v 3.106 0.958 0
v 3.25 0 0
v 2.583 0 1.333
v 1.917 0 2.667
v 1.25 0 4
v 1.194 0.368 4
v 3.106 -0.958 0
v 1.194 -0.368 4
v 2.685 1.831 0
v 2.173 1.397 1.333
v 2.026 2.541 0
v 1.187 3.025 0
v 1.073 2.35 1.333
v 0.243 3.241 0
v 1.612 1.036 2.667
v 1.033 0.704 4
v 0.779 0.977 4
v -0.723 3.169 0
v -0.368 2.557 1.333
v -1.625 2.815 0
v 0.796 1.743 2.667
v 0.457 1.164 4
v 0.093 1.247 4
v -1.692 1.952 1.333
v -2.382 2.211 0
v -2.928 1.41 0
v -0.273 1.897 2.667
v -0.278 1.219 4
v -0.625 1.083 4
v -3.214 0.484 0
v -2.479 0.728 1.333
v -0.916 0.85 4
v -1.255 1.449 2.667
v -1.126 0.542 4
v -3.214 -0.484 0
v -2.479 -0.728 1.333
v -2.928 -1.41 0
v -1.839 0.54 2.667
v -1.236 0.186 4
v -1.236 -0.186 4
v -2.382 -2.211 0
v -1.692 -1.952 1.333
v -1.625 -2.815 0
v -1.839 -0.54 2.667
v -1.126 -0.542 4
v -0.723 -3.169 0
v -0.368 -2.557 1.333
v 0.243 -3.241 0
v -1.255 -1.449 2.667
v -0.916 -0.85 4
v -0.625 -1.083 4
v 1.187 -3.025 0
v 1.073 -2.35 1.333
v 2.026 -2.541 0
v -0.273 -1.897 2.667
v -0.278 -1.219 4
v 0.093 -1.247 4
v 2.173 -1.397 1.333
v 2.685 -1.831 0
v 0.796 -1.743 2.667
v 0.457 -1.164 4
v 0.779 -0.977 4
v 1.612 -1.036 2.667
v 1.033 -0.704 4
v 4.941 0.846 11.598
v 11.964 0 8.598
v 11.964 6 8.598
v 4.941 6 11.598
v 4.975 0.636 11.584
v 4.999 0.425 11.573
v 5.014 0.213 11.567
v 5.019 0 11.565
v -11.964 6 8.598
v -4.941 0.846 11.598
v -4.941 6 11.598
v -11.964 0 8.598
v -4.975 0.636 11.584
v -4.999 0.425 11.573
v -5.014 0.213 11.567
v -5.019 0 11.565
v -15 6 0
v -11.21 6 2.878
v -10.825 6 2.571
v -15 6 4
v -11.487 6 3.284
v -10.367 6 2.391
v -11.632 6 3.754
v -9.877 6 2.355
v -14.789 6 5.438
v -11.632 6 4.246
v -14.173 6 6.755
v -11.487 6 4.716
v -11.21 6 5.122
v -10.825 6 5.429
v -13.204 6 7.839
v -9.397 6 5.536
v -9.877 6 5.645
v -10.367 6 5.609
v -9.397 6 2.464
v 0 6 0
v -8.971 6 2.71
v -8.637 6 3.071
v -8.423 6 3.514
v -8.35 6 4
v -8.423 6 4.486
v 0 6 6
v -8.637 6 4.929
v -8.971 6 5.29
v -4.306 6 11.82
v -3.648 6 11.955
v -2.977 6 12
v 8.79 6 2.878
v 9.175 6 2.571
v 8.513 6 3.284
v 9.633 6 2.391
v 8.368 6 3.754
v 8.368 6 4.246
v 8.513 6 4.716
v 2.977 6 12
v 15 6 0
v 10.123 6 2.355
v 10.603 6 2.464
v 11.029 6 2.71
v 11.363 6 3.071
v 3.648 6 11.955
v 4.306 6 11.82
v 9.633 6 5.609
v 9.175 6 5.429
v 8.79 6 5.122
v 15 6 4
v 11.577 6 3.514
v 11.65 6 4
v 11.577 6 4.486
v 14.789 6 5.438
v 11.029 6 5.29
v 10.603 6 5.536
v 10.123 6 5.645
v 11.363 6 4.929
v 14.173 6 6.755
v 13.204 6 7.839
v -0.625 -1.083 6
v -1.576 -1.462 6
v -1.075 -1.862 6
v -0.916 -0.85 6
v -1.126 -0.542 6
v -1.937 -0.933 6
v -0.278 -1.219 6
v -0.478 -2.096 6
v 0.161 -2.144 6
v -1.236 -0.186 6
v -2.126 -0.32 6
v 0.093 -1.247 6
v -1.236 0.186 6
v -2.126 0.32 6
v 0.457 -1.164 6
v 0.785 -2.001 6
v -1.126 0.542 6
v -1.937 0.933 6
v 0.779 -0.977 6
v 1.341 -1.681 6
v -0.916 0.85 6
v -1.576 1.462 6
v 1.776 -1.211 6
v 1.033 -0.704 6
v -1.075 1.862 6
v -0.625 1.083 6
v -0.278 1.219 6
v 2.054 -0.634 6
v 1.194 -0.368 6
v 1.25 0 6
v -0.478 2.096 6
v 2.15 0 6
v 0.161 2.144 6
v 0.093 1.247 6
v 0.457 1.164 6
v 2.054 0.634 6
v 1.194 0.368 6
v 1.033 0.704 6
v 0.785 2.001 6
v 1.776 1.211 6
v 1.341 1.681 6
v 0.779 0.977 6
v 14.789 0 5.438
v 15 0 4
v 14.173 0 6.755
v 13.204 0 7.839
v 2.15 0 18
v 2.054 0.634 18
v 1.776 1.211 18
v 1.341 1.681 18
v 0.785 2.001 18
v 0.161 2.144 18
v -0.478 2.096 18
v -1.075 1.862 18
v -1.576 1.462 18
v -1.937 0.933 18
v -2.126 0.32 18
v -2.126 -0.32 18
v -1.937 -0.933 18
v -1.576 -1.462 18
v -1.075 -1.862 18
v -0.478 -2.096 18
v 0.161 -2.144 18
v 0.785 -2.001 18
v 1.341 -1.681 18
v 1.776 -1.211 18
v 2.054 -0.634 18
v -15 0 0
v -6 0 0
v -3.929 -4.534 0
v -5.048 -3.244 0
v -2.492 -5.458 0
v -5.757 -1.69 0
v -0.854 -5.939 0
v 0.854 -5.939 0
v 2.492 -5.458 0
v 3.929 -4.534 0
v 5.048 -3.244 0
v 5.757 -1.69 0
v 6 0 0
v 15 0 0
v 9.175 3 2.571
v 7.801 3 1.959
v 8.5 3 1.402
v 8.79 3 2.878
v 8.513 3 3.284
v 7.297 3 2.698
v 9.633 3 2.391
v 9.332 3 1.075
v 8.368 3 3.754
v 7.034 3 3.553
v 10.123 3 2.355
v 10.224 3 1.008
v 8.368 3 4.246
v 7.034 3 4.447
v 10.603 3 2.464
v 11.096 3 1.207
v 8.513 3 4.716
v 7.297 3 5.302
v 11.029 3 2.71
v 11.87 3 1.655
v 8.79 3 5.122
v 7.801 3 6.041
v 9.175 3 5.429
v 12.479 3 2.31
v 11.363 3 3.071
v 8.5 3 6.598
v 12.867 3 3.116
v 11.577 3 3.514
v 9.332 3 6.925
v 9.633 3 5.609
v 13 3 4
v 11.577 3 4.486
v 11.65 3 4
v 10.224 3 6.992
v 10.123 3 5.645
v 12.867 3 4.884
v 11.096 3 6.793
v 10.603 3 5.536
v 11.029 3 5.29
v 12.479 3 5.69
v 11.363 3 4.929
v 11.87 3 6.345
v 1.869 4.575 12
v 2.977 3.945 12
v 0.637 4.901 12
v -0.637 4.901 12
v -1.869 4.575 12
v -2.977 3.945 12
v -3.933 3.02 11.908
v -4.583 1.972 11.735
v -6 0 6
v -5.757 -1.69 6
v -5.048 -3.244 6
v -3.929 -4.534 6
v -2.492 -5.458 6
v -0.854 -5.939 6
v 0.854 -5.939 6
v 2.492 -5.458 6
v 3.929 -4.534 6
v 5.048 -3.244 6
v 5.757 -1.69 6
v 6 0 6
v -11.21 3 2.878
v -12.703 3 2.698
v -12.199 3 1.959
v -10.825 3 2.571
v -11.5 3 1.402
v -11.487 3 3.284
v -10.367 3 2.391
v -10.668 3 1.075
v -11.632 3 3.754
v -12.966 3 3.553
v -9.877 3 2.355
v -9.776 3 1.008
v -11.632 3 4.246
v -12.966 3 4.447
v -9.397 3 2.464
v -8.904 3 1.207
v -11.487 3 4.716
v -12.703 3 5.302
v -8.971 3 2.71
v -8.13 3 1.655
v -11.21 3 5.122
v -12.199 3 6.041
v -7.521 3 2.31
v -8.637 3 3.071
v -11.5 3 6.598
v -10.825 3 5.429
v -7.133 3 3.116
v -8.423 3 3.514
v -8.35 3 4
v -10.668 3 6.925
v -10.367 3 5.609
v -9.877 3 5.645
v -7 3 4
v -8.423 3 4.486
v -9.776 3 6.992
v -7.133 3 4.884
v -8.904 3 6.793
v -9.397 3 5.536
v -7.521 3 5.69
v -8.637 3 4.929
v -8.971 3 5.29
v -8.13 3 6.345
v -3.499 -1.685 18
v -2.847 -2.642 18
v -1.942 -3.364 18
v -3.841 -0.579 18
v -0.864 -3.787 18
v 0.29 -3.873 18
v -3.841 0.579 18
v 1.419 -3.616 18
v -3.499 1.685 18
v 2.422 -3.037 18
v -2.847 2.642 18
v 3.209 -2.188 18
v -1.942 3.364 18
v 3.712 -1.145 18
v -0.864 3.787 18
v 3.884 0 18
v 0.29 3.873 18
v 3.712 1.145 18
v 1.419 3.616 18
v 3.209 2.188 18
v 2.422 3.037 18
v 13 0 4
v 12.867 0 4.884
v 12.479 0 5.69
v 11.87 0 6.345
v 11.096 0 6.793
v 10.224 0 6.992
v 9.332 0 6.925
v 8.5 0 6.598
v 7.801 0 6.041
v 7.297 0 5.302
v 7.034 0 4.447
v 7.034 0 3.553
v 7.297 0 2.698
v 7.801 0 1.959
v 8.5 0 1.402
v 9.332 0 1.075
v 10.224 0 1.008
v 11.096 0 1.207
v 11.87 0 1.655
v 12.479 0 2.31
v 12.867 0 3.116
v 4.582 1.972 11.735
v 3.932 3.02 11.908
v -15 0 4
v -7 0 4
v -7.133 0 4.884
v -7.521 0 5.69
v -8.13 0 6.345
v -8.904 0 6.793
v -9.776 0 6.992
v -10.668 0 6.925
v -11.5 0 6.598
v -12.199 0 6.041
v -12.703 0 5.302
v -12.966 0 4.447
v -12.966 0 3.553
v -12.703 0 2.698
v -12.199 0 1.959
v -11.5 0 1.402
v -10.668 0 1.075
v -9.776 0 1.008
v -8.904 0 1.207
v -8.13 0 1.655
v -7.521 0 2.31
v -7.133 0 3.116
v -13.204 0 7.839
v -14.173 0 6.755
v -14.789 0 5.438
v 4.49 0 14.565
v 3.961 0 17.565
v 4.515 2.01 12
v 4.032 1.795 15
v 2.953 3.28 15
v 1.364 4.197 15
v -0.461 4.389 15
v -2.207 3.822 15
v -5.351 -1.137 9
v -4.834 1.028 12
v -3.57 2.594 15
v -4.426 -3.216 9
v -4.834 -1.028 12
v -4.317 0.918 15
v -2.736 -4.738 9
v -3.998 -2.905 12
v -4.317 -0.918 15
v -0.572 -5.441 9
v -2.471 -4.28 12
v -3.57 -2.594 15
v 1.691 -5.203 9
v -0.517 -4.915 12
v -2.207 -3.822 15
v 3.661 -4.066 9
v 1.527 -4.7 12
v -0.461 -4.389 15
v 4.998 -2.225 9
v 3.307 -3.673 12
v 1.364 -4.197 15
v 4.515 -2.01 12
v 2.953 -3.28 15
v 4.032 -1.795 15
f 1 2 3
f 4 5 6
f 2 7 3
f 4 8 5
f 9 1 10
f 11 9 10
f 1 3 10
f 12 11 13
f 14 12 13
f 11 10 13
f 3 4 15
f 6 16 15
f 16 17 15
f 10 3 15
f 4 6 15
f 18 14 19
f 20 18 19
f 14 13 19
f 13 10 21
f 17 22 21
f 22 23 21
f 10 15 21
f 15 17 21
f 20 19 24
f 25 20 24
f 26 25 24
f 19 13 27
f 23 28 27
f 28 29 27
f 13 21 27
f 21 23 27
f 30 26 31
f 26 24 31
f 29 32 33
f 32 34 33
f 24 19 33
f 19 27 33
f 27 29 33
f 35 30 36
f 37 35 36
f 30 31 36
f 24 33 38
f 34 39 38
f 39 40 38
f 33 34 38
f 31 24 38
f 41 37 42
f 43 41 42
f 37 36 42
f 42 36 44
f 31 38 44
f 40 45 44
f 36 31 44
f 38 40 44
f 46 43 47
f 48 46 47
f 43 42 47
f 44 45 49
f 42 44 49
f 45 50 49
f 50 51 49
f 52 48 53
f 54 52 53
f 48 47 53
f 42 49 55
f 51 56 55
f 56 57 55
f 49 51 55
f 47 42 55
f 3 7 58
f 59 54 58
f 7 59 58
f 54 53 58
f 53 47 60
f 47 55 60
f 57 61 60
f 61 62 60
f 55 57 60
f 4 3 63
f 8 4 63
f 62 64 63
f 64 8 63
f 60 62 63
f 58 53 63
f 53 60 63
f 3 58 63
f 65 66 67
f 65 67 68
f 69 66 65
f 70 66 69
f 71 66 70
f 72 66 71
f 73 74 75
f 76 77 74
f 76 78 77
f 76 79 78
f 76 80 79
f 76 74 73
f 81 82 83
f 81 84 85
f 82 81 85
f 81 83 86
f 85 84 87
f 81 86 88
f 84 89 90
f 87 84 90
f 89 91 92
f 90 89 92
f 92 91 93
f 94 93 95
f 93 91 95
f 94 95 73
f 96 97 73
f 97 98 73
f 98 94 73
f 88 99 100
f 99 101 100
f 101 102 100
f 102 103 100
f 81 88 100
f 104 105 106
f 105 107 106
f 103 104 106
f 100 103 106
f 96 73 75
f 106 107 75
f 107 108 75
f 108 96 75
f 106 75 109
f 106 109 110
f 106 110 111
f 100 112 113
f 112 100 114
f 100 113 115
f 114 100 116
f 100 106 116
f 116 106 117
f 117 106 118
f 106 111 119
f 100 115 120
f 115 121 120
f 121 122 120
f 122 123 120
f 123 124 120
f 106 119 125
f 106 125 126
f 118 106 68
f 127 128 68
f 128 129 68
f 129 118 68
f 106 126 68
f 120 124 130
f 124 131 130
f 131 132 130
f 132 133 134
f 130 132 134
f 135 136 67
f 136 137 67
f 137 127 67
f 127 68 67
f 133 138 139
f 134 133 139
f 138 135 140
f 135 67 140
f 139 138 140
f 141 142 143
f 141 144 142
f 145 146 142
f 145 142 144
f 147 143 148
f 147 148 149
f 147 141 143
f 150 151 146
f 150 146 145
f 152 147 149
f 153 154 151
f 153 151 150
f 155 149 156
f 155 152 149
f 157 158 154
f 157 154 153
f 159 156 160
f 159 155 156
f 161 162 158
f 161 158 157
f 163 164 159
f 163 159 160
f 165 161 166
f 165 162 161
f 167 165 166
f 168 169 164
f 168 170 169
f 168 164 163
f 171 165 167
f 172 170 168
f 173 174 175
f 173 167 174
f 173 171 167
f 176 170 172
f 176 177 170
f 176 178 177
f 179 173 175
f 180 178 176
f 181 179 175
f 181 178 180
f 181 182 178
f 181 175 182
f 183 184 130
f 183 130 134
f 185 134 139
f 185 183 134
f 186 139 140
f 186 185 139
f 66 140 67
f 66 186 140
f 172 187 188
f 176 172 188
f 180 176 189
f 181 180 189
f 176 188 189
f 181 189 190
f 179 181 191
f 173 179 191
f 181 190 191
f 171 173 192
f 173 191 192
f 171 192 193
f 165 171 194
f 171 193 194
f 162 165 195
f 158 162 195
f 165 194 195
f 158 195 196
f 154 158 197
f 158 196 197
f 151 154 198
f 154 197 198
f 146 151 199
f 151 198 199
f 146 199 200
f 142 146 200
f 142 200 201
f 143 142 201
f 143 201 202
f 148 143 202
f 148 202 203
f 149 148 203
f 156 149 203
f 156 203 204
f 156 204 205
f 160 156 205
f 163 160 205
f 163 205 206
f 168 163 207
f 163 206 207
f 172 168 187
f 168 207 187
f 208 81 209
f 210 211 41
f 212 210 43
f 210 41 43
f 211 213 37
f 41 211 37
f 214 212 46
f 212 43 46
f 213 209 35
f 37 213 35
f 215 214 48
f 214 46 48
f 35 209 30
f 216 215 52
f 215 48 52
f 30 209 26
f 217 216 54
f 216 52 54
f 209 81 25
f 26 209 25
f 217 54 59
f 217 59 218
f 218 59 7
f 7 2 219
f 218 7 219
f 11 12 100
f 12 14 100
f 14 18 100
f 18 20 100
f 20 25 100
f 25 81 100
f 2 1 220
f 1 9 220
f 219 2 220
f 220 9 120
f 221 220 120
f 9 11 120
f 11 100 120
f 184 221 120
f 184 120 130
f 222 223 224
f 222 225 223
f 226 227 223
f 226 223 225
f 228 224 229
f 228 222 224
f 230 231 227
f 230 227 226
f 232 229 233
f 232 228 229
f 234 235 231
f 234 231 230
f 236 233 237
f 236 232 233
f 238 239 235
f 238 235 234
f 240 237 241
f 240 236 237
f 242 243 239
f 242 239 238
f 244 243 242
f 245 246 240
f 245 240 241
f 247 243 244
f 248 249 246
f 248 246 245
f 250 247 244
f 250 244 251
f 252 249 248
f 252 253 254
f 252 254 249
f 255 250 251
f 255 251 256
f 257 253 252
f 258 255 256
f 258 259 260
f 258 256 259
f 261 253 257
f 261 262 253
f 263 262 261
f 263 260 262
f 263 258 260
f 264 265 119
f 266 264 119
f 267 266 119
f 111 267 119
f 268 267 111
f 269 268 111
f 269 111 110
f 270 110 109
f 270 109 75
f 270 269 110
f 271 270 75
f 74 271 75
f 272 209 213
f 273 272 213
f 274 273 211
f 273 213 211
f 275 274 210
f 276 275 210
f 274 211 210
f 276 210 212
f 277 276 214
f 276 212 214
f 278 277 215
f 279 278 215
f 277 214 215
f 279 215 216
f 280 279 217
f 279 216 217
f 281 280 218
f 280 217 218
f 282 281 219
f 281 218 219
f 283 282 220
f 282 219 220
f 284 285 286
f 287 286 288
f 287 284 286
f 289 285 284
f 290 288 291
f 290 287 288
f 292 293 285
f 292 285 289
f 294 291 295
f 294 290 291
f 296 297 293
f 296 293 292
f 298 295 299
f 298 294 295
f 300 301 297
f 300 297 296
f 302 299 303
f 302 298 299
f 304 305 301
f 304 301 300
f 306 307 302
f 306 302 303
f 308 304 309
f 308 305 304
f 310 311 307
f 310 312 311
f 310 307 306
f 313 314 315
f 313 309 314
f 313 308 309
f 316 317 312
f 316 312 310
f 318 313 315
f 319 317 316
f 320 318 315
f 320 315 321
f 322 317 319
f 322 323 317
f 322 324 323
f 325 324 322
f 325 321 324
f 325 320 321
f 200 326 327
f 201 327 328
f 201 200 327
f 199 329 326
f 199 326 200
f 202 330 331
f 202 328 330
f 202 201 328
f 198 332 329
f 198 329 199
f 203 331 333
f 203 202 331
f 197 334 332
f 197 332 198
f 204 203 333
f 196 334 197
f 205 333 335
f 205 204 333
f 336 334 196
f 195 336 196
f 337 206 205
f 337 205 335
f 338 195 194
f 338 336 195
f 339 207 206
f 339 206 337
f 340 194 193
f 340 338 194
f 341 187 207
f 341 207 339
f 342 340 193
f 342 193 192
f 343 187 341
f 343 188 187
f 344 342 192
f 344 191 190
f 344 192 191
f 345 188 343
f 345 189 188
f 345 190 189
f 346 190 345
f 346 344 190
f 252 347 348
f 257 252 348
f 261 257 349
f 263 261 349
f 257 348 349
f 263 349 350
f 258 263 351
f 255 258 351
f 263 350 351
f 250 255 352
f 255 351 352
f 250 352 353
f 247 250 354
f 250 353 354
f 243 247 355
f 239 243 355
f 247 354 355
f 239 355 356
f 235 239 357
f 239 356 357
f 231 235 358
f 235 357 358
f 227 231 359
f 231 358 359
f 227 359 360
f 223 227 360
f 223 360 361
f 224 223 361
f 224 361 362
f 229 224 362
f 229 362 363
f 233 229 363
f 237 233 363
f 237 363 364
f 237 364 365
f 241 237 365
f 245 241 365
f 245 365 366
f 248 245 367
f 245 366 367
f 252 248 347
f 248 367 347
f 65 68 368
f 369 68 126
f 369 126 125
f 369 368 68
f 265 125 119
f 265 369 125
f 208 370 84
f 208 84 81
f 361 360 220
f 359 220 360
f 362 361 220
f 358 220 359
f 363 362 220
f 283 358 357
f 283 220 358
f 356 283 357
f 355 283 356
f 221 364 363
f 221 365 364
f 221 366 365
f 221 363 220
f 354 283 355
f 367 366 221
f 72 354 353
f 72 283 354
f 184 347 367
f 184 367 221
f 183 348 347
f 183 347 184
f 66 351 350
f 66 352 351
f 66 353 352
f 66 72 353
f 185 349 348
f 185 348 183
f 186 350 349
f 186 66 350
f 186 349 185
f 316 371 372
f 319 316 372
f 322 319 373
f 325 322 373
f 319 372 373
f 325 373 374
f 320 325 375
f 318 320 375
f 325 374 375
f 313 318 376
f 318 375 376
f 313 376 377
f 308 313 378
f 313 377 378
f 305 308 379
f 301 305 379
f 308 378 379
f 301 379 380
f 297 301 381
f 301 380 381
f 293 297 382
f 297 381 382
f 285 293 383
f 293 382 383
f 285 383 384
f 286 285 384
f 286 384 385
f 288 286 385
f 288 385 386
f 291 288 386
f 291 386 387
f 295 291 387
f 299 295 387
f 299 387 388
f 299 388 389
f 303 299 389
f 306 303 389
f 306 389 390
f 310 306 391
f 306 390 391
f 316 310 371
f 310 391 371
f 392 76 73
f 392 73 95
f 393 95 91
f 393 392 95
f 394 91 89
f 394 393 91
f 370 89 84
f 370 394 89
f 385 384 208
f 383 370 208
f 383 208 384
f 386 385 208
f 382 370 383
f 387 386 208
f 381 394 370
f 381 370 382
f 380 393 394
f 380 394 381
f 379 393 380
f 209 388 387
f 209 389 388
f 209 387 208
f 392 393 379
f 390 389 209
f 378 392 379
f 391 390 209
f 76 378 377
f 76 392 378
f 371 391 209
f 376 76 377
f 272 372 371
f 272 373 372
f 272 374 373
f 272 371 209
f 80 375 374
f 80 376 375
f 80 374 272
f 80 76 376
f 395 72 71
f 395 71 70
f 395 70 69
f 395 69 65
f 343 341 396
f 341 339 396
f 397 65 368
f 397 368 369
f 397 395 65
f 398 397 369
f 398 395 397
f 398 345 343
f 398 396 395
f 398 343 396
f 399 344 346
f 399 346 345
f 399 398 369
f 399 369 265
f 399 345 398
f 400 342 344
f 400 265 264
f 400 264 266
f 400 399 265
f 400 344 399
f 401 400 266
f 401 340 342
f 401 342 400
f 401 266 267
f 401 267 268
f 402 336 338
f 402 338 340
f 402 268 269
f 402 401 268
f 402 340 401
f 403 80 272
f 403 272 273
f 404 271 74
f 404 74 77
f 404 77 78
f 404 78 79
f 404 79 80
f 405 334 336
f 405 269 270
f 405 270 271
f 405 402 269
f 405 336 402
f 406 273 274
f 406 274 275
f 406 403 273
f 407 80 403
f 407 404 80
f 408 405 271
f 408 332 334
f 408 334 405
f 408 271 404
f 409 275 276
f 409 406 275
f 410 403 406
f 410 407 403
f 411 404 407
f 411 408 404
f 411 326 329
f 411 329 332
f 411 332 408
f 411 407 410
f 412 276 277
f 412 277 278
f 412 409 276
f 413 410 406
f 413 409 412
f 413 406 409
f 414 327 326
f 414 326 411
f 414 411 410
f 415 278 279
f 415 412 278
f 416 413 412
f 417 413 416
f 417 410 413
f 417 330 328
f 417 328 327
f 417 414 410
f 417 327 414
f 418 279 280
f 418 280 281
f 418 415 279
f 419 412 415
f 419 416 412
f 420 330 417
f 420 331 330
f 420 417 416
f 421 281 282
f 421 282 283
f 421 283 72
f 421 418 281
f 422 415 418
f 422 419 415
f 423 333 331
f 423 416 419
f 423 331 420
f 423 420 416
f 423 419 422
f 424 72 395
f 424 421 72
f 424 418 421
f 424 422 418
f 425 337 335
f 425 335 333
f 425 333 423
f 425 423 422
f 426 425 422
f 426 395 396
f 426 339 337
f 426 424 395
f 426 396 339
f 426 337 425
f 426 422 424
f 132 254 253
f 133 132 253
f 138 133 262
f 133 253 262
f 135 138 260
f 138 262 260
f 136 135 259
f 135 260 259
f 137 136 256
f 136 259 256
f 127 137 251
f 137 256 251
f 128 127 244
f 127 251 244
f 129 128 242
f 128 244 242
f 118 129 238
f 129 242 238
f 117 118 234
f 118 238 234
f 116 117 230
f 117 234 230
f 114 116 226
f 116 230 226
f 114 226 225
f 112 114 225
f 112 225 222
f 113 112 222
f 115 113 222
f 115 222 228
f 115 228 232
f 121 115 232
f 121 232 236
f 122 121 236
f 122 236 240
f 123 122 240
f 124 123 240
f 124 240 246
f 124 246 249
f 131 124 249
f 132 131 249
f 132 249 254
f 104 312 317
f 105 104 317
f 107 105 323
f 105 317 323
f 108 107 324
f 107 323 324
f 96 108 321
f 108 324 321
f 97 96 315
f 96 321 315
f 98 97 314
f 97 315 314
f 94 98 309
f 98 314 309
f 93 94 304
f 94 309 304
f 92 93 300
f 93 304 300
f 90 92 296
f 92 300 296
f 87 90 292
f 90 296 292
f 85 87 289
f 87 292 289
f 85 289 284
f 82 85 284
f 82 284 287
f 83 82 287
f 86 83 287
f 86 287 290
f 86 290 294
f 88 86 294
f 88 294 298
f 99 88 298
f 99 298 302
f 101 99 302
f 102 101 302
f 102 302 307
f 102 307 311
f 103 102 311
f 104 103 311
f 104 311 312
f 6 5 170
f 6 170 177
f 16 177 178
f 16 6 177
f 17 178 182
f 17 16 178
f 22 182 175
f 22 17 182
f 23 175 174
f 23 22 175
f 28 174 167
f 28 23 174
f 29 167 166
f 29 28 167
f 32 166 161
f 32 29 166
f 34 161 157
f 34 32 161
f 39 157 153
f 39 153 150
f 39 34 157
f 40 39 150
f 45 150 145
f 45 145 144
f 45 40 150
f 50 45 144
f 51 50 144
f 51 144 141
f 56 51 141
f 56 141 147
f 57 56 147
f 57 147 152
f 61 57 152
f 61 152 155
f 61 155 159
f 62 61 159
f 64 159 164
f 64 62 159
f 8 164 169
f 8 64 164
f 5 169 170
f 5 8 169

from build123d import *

# Parameters (mm, degrees)
F1_R      = 1.65
F2_DEPTH  = 6
F3_R      = 3.75
F4_DEPTH  = 12.001
F5_R      = 6
F5_R_2    = 1.25
F6_DEPTH  = 6
F7_SIZE2  = 4
F7_SIZE   = 2
F8_R      = 6
F9_DEPTH  = 12
F9_TAPER  = 10
F10_R     = 2.15
F11_DEPTH = 12
F12_R     = 3
F13_DEPTH = 3
F14_R     = 3
F15_DEPTH = 3


with BuildPart() as f2:
    # F1 (on Front) → F2 (new body)
    with BuildSketch(Plane.XZ):
        with BuildLine():
            Line((15, 0), (15, 4))
            ThreePointArc((15, 4), (14.1725596506, 6.7549493575), (11.9641016151, 8.5980762114))
            Line((11.9641016151, 8.5980762114), (4.9409269852, 11.5980762114))
            ThreePointArc((4.9409269852, 11.5980762114), (3.9792272214, 11.8984885963), (2.9768253701, 12))
            Line((2.9768253701, 12), (0, 12))
            Line((0, 12), (-2.9768253701, 12))
            ThreePointArc((-2.9768253701, 12), (-3.9792272214, 11.8984885963), (-4.9409269852, 11.5980762114))
            Line((-4.9409269852, 11.5980762114), (-11.9641016151, 8.5980762114))
            ThreePointArc((-11.9641016151, 8.5980762114), (-14.1725596506, 6.7549493575), (-15, 4))
            Line((-15, 4), (-15, 0))
            Line((-15, 0), (0, 0))
            Line((0, 0), (15, 0))
        make_face()
        with Locations((-10, 4)):
            Circle(F1_R, mode=Mode.SUBTRACT)
        with Locations((10, 4)):
            Circle(F1_R, mode=Mode.SUBTRACT)
    extrude(amount=-F2_DEPTH)

    # F3 (on face) → F4 (cut, through all)
    with BuildSketch(Plane.XY.offset(12)):
        Circle(F3_R)
    extrude(amount=-F4_DEPTH, mode=Mode.SUBTRACT)



with BuildPart() as f6:
    # F5 (on Top) → F6 (new body)
    with BuildSketch(Plane.XY):
        Circle(F5_R)
        Circle(F5_R_2, mode=Mode.SUBTRACT)
    extrude(amount=F6_DEPTH)

    # F7
    f7_edges = [f6.edges().sort_by_distance(p)[0] for p in [
        (-1.25, 0, 0),
    ]]
    f7_side = f6.faces().sort_by_distance((-5.830294, 0, 0))[0]
    chamfer(f7_edges, length=F7_SIZE, length2=F7_SIZE2, reference=f7_side)


with BuildPart() as f2_1:
    add(f2.part)

    add(f6.part)  # F9 merges F6
    # F8 (on face) → F9 (join)
    with BuildSketch(Plane.XY.offset(6)):
        Circle(F8_R)
    extrude(amount=F9_DEPTH, taper=F9_TAPER)

    # F10 (on face) → F11 (cut)
    with BuildSketch(Plane.XY.offset(18)):
        Circle(F10_R)
    extrude(amount=-F11_DEPTH, mode=Mode.SUBTRACT)

    # F12 (on face) → F13 (cut)
    with BuildSketch(Plane.XZ):
        with Locations((-10, 4)):
            Circle(F12_R)
    extrude(amount=-F13_DEPTH, mode=Mode.SUBTRACT)

    # F14 (on face) → F15 (cut)
    with BuildSketch(Plane.XZ):
        with Locations((10, 4)):
            Circle(F14_R)
    extrude(amount=-F15_DEPTH, mode=Mode.SUBTRACT)


solid = f2_1.part
